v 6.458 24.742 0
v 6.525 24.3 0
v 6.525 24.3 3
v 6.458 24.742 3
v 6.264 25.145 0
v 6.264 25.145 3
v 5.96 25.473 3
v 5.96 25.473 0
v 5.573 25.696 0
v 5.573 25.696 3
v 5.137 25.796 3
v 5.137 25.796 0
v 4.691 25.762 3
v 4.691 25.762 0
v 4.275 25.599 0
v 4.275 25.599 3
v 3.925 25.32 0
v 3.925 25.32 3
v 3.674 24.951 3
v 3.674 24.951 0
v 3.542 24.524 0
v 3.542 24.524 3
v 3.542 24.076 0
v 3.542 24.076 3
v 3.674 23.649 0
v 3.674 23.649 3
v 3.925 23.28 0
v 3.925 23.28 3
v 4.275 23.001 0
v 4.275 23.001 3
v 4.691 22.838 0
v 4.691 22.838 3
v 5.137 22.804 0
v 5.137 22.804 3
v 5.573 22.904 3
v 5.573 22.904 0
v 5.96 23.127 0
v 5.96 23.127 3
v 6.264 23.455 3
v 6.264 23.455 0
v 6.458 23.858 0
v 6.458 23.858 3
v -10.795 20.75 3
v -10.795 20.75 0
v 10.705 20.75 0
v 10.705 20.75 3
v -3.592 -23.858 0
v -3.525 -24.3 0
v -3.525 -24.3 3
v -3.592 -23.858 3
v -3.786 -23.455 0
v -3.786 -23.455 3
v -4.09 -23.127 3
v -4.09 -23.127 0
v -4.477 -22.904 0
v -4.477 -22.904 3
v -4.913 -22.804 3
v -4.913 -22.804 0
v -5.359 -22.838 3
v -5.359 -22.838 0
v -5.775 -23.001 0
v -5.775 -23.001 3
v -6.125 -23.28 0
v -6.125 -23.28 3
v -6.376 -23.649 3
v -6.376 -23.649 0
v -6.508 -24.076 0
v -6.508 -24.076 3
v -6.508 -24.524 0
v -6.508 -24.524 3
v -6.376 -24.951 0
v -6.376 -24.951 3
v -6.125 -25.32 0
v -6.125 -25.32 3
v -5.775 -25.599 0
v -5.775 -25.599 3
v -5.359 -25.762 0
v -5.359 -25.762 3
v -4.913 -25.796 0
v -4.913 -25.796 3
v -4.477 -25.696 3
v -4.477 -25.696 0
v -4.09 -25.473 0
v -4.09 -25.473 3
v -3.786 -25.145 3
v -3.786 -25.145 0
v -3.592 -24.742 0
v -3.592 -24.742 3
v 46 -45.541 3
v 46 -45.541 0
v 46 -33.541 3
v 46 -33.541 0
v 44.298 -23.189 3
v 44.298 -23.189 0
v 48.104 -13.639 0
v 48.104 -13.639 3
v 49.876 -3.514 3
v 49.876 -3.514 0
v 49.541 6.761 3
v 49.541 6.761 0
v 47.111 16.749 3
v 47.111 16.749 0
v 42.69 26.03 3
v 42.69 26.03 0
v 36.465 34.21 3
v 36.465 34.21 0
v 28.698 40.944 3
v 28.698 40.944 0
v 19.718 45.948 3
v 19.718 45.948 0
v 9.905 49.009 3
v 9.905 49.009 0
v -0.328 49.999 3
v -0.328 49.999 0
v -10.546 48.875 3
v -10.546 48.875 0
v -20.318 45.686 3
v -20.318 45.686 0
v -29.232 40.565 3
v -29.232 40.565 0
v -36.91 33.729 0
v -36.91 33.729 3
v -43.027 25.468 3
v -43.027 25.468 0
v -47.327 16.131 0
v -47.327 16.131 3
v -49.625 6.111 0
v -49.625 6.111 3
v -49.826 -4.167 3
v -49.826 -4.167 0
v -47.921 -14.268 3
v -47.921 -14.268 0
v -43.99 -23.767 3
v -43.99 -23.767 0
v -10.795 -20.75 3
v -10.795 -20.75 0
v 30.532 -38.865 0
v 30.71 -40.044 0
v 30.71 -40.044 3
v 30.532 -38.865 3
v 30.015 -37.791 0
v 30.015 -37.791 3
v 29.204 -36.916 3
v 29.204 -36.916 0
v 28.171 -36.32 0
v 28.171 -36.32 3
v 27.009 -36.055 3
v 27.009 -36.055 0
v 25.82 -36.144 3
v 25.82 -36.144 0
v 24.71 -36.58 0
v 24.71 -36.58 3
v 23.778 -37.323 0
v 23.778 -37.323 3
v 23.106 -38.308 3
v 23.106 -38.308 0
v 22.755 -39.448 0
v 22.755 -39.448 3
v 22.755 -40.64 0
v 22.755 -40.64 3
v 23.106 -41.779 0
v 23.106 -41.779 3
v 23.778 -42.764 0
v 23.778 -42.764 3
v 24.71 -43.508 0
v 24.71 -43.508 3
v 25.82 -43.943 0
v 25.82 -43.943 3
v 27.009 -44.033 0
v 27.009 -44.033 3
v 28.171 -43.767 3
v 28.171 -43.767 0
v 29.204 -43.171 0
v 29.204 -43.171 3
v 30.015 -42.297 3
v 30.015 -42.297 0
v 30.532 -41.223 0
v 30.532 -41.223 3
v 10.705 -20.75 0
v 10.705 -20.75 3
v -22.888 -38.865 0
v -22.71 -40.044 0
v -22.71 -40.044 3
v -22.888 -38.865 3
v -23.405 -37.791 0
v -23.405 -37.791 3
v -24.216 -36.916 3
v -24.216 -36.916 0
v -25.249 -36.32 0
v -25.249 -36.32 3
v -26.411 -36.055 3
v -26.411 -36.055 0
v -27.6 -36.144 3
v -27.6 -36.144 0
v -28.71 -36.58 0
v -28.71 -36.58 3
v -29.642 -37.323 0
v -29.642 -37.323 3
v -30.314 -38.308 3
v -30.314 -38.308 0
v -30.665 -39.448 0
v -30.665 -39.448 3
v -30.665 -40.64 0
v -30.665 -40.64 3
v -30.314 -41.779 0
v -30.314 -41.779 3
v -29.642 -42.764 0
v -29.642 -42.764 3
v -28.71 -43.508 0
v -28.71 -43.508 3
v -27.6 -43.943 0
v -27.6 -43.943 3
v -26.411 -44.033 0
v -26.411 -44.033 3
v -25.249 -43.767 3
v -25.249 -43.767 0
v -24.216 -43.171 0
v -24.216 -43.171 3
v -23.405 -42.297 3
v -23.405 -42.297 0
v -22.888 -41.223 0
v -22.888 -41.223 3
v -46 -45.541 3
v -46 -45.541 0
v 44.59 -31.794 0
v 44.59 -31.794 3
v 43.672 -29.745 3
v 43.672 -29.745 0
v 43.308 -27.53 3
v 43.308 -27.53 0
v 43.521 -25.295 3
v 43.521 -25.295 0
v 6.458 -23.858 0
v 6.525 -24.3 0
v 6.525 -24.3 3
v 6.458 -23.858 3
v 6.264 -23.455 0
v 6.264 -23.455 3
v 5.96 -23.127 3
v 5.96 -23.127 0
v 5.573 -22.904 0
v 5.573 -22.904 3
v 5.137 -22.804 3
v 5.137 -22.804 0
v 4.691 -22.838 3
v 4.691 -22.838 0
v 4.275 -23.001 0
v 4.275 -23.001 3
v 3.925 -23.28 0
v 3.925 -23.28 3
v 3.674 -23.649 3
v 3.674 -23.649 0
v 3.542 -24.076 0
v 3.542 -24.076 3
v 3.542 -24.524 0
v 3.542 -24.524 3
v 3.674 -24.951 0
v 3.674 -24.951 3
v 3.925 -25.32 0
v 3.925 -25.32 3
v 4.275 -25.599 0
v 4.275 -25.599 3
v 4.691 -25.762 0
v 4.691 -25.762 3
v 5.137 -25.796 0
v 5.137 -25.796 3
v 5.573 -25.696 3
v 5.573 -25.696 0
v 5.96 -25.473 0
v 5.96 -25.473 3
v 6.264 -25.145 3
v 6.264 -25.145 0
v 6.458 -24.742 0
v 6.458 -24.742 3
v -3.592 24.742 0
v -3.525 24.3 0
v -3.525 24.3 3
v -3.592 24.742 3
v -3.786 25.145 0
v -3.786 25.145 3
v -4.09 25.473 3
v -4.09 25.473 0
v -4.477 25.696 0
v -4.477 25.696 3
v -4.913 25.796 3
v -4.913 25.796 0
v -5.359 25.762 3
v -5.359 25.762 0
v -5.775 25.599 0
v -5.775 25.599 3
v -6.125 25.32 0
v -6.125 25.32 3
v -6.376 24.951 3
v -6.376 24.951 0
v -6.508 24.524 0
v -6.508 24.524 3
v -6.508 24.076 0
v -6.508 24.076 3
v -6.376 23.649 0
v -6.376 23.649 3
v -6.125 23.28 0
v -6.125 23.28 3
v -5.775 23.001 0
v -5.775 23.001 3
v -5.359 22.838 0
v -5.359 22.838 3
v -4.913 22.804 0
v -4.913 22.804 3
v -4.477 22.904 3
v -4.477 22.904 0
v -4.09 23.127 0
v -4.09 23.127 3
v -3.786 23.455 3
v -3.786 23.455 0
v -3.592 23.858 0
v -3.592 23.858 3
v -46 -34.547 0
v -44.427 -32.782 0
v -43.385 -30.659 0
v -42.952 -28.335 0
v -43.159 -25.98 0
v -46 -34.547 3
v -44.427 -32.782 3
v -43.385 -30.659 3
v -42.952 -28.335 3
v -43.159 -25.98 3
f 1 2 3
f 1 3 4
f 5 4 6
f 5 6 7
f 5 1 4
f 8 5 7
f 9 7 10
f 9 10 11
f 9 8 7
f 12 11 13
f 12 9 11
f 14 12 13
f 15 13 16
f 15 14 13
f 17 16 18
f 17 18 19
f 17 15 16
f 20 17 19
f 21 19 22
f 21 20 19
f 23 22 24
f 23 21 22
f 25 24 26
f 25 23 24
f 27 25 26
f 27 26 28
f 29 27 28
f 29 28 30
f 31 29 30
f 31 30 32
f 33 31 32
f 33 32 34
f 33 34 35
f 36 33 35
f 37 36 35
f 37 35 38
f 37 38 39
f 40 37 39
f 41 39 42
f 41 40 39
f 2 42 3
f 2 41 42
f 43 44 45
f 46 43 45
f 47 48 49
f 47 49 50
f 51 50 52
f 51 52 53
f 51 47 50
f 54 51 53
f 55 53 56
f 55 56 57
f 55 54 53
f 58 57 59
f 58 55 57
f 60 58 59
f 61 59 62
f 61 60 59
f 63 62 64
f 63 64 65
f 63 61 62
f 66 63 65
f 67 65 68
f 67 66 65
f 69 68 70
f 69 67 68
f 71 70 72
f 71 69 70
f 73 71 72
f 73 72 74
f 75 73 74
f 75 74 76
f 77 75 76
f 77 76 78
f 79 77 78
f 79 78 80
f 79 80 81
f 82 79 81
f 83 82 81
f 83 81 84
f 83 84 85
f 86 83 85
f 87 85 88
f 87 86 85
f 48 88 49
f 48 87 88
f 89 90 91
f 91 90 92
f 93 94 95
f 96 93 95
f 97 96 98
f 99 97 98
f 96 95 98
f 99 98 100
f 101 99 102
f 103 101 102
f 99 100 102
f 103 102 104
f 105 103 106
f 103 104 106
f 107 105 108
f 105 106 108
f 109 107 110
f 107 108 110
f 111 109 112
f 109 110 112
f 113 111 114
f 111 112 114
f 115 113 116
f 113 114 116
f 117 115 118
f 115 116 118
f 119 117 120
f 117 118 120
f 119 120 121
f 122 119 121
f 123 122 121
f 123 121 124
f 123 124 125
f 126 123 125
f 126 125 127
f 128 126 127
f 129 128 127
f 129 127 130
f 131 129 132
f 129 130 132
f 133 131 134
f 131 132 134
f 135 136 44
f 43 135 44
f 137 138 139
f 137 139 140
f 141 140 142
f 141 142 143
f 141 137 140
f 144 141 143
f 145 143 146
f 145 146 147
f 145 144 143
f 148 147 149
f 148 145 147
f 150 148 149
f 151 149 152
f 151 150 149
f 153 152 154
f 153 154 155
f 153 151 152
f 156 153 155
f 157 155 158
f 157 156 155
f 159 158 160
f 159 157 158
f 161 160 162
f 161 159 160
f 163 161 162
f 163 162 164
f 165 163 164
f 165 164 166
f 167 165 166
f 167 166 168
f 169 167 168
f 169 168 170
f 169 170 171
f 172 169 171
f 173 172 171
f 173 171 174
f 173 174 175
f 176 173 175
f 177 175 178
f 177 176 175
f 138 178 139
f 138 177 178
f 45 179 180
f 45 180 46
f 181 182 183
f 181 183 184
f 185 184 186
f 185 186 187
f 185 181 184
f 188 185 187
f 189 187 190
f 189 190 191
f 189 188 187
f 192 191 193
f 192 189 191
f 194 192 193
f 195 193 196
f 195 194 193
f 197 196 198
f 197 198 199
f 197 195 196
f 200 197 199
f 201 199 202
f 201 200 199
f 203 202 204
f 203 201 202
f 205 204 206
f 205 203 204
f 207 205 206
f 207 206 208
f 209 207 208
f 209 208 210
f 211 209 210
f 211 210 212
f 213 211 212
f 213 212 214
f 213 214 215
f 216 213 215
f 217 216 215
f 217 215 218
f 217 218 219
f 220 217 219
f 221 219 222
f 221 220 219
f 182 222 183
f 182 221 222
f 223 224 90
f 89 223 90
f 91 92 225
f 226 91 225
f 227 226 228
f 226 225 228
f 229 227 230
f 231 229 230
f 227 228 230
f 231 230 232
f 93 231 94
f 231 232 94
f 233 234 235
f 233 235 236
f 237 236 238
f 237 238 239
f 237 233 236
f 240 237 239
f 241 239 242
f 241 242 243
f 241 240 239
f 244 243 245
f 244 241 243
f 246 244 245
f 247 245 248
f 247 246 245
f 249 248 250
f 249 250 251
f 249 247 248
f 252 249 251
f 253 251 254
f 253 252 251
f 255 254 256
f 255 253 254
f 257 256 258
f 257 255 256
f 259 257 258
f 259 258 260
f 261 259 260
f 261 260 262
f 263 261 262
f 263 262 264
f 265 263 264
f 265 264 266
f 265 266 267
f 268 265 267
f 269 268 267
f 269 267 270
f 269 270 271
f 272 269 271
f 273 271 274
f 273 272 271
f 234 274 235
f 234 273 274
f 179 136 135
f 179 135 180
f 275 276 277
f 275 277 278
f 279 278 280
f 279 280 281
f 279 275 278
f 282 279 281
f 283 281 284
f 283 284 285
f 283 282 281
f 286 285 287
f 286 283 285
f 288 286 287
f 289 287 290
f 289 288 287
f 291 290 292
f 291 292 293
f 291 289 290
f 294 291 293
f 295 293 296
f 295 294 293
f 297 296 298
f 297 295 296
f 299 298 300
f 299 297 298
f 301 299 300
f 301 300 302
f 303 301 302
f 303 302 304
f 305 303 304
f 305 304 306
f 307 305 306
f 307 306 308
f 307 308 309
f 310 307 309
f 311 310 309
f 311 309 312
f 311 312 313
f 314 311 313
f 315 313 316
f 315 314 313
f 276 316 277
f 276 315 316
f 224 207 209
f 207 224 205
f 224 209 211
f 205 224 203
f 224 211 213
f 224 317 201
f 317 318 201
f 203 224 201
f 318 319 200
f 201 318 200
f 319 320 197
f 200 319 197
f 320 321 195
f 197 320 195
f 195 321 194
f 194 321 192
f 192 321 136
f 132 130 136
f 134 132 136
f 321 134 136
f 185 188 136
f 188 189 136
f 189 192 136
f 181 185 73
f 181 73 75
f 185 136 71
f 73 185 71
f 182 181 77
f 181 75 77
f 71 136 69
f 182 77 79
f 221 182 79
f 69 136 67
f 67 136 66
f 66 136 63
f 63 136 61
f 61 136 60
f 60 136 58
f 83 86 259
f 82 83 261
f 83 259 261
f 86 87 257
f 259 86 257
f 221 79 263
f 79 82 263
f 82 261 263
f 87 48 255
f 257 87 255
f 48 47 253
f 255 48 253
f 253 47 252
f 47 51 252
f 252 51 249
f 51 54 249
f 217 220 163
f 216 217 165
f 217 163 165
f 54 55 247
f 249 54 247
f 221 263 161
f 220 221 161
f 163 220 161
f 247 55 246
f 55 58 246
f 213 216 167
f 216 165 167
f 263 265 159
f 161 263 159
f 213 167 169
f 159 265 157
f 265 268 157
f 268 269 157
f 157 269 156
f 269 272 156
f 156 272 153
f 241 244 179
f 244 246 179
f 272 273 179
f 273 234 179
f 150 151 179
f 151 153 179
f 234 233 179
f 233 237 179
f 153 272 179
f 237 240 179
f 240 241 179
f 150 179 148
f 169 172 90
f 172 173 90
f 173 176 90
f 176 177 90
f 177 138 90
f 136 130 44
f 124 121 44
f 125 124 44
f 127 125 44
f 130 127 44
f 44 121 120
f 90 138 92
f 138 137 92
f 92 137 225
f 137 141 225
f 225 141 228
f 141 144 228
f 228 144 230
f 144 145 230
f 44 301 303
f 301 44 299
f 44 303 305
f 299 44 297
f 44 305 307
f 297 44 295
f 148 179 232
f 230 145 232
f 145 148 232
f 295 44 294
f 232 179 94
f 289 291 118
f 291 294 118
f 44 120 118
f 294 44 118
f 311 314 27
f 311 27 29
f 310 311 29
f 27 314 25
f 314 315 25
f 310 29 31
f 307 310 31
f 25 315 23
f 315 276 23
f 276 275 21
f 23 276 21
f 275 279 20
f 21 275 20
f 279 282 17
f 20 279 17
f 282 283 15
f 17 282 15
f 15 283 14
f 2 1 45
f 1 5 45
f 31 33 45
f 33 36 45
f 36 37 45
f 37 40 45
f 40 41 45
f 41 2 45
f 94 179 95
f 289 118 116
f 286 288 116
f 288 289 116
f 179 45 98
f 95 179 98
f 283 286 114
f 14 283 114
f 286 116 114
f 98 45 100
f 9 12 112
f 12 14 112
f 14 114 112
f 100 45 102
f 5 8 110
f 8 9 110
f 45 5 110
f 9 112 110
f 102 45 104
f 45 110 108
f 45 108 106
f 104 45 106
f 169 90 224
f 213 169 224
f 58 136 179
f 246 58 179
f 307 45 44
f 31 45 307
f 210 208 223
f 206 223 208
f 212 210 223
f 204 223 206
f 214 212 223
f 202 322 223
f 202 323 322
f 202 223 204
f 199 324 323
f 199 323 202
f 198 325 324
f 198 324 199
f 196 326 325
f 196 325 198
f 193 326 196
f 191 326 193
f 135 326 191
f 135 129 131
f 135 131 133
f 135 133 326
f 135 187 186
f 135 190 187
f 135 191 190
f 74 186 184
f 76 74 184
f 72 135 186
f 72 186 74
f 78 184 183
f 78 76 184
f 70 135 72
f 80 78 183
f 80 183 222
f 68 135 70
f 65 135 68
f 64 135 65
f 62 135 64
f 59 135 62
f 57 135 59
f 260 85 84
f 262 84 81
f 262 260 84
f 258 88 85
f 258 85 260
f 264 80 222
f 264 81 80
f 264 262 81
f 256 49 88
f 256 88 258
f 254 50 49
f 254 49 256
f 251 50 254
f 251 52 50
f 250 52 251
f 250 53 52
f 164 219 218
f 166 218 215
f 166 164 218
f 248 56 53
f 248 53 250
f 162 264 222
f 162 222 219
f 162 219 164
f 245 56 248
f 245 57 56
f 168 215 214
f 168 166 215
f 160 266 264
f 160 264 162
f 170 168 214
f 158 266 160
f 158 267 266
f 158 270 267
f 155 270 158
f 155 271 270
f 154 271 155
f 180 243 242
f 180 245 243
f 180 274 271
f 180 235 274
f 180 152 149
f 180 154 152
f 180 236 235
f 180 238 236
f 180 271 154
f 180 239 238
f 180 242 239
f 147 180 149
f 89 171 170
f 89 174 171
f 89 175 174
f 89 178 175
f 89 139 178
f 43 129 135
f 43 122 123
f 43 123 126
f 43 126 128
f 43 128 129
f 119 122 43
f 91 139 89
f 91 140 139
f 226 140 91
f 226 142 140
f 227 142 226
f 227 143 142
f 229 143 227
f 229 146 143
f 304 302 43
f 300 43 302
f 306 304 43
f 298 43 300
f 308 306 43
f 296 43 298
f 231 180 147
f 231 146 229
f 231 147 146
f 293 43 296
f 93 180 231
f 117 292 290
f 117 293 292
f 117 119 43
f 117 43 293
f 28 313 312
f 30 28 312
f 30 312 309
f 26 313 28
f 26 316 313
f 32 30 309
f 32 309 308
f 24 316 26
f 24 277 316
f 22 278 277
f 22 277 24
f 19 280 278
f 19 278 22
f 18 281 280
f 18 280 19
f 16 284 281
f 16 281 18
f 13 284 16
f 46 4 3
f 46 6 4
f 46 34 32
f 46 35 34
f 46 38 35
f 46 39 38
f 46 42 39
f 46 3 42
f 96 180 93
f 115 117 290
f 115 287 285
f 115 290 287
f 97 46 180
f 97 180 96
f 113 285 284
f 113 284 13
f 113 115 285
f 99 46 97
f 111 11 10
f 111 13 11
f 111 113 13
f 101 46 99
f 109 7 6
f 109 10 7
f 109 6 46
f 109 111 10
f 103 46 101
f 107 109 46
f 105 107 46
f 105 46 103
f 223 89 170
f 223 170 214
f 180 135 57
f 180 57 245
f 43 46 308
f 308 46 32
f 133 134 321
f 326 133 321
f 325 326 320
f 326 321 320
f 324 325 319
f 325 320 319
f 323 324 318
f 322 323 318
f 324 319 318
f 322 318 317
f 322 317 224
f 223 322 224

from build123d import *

# Parameters (mm, degrees)
SKETCH1_R           = 4
SKETCH1_R_2         = 1.5
SKETCH1_W           = 21.5
SKETCH1_H           = 41.5
BOSS_EXTRUDE1_DEPTH = 3


with BuildPart() as part:
    # Sketch1 → Boss-Extrude1 (new body)
    with BuildSketch(Plane.XY):
        with BuildLine():
            Line((-46, -34.546554859), (-46, -45.541019662))
            Line((-46, -45.541019662), (46, -45.541019662))
            Line((46, -45.541019662), (46, -33.541019662))
            ThreePointArc((46, -33.541019662), (43.418499553, -28.649357855), (44.29771076, -23.188635609))
            ThreePointArc((44.29771076, -23.188635609), (-0.32750764, 49.998927376), (-43.990137922, -23.766946914))
            ThreePointArc((-43.990137922, -23.766946914), (-43.089457574, -29.512052868), (-46, -34.546554859))
        make_face()
        with Locations((-26.71, -40.043787261)):
            Circle(SKETCH1_R, mode=Mode.SUBTRACT)
        with Locations((26.71, -40.043787261)):
            Circle(SKETCH1_R, mode=Mode.SUBTRACT)
        with Locations((5.025, -24.3)):
            Circle(SKETCH1_R_2, mode=Mode.SUBTRACT)
        with Locations((-5.025, -24.3)):
            Circle(SKETCH1_R_2, mode=Mode.SUBTRACT)
        with Locations((5.025, 24.3)):
            Circle(SKETCH1_R_2, mode=Mode.SUBTRACT)
        with Locations((-5.025, 24.3)):
            Circle(SKETCH1_R_2, mode=Mode.SUBTRACT)
        with Locations((-0.044828014, 0)):
            Rectangle(SKETCH1_W, SKETCH1_H, mode=Mode.SUBTRACT)
    extrude(amount=BOSS_EXTRUDE1_DEPTH)


solid = part.part
